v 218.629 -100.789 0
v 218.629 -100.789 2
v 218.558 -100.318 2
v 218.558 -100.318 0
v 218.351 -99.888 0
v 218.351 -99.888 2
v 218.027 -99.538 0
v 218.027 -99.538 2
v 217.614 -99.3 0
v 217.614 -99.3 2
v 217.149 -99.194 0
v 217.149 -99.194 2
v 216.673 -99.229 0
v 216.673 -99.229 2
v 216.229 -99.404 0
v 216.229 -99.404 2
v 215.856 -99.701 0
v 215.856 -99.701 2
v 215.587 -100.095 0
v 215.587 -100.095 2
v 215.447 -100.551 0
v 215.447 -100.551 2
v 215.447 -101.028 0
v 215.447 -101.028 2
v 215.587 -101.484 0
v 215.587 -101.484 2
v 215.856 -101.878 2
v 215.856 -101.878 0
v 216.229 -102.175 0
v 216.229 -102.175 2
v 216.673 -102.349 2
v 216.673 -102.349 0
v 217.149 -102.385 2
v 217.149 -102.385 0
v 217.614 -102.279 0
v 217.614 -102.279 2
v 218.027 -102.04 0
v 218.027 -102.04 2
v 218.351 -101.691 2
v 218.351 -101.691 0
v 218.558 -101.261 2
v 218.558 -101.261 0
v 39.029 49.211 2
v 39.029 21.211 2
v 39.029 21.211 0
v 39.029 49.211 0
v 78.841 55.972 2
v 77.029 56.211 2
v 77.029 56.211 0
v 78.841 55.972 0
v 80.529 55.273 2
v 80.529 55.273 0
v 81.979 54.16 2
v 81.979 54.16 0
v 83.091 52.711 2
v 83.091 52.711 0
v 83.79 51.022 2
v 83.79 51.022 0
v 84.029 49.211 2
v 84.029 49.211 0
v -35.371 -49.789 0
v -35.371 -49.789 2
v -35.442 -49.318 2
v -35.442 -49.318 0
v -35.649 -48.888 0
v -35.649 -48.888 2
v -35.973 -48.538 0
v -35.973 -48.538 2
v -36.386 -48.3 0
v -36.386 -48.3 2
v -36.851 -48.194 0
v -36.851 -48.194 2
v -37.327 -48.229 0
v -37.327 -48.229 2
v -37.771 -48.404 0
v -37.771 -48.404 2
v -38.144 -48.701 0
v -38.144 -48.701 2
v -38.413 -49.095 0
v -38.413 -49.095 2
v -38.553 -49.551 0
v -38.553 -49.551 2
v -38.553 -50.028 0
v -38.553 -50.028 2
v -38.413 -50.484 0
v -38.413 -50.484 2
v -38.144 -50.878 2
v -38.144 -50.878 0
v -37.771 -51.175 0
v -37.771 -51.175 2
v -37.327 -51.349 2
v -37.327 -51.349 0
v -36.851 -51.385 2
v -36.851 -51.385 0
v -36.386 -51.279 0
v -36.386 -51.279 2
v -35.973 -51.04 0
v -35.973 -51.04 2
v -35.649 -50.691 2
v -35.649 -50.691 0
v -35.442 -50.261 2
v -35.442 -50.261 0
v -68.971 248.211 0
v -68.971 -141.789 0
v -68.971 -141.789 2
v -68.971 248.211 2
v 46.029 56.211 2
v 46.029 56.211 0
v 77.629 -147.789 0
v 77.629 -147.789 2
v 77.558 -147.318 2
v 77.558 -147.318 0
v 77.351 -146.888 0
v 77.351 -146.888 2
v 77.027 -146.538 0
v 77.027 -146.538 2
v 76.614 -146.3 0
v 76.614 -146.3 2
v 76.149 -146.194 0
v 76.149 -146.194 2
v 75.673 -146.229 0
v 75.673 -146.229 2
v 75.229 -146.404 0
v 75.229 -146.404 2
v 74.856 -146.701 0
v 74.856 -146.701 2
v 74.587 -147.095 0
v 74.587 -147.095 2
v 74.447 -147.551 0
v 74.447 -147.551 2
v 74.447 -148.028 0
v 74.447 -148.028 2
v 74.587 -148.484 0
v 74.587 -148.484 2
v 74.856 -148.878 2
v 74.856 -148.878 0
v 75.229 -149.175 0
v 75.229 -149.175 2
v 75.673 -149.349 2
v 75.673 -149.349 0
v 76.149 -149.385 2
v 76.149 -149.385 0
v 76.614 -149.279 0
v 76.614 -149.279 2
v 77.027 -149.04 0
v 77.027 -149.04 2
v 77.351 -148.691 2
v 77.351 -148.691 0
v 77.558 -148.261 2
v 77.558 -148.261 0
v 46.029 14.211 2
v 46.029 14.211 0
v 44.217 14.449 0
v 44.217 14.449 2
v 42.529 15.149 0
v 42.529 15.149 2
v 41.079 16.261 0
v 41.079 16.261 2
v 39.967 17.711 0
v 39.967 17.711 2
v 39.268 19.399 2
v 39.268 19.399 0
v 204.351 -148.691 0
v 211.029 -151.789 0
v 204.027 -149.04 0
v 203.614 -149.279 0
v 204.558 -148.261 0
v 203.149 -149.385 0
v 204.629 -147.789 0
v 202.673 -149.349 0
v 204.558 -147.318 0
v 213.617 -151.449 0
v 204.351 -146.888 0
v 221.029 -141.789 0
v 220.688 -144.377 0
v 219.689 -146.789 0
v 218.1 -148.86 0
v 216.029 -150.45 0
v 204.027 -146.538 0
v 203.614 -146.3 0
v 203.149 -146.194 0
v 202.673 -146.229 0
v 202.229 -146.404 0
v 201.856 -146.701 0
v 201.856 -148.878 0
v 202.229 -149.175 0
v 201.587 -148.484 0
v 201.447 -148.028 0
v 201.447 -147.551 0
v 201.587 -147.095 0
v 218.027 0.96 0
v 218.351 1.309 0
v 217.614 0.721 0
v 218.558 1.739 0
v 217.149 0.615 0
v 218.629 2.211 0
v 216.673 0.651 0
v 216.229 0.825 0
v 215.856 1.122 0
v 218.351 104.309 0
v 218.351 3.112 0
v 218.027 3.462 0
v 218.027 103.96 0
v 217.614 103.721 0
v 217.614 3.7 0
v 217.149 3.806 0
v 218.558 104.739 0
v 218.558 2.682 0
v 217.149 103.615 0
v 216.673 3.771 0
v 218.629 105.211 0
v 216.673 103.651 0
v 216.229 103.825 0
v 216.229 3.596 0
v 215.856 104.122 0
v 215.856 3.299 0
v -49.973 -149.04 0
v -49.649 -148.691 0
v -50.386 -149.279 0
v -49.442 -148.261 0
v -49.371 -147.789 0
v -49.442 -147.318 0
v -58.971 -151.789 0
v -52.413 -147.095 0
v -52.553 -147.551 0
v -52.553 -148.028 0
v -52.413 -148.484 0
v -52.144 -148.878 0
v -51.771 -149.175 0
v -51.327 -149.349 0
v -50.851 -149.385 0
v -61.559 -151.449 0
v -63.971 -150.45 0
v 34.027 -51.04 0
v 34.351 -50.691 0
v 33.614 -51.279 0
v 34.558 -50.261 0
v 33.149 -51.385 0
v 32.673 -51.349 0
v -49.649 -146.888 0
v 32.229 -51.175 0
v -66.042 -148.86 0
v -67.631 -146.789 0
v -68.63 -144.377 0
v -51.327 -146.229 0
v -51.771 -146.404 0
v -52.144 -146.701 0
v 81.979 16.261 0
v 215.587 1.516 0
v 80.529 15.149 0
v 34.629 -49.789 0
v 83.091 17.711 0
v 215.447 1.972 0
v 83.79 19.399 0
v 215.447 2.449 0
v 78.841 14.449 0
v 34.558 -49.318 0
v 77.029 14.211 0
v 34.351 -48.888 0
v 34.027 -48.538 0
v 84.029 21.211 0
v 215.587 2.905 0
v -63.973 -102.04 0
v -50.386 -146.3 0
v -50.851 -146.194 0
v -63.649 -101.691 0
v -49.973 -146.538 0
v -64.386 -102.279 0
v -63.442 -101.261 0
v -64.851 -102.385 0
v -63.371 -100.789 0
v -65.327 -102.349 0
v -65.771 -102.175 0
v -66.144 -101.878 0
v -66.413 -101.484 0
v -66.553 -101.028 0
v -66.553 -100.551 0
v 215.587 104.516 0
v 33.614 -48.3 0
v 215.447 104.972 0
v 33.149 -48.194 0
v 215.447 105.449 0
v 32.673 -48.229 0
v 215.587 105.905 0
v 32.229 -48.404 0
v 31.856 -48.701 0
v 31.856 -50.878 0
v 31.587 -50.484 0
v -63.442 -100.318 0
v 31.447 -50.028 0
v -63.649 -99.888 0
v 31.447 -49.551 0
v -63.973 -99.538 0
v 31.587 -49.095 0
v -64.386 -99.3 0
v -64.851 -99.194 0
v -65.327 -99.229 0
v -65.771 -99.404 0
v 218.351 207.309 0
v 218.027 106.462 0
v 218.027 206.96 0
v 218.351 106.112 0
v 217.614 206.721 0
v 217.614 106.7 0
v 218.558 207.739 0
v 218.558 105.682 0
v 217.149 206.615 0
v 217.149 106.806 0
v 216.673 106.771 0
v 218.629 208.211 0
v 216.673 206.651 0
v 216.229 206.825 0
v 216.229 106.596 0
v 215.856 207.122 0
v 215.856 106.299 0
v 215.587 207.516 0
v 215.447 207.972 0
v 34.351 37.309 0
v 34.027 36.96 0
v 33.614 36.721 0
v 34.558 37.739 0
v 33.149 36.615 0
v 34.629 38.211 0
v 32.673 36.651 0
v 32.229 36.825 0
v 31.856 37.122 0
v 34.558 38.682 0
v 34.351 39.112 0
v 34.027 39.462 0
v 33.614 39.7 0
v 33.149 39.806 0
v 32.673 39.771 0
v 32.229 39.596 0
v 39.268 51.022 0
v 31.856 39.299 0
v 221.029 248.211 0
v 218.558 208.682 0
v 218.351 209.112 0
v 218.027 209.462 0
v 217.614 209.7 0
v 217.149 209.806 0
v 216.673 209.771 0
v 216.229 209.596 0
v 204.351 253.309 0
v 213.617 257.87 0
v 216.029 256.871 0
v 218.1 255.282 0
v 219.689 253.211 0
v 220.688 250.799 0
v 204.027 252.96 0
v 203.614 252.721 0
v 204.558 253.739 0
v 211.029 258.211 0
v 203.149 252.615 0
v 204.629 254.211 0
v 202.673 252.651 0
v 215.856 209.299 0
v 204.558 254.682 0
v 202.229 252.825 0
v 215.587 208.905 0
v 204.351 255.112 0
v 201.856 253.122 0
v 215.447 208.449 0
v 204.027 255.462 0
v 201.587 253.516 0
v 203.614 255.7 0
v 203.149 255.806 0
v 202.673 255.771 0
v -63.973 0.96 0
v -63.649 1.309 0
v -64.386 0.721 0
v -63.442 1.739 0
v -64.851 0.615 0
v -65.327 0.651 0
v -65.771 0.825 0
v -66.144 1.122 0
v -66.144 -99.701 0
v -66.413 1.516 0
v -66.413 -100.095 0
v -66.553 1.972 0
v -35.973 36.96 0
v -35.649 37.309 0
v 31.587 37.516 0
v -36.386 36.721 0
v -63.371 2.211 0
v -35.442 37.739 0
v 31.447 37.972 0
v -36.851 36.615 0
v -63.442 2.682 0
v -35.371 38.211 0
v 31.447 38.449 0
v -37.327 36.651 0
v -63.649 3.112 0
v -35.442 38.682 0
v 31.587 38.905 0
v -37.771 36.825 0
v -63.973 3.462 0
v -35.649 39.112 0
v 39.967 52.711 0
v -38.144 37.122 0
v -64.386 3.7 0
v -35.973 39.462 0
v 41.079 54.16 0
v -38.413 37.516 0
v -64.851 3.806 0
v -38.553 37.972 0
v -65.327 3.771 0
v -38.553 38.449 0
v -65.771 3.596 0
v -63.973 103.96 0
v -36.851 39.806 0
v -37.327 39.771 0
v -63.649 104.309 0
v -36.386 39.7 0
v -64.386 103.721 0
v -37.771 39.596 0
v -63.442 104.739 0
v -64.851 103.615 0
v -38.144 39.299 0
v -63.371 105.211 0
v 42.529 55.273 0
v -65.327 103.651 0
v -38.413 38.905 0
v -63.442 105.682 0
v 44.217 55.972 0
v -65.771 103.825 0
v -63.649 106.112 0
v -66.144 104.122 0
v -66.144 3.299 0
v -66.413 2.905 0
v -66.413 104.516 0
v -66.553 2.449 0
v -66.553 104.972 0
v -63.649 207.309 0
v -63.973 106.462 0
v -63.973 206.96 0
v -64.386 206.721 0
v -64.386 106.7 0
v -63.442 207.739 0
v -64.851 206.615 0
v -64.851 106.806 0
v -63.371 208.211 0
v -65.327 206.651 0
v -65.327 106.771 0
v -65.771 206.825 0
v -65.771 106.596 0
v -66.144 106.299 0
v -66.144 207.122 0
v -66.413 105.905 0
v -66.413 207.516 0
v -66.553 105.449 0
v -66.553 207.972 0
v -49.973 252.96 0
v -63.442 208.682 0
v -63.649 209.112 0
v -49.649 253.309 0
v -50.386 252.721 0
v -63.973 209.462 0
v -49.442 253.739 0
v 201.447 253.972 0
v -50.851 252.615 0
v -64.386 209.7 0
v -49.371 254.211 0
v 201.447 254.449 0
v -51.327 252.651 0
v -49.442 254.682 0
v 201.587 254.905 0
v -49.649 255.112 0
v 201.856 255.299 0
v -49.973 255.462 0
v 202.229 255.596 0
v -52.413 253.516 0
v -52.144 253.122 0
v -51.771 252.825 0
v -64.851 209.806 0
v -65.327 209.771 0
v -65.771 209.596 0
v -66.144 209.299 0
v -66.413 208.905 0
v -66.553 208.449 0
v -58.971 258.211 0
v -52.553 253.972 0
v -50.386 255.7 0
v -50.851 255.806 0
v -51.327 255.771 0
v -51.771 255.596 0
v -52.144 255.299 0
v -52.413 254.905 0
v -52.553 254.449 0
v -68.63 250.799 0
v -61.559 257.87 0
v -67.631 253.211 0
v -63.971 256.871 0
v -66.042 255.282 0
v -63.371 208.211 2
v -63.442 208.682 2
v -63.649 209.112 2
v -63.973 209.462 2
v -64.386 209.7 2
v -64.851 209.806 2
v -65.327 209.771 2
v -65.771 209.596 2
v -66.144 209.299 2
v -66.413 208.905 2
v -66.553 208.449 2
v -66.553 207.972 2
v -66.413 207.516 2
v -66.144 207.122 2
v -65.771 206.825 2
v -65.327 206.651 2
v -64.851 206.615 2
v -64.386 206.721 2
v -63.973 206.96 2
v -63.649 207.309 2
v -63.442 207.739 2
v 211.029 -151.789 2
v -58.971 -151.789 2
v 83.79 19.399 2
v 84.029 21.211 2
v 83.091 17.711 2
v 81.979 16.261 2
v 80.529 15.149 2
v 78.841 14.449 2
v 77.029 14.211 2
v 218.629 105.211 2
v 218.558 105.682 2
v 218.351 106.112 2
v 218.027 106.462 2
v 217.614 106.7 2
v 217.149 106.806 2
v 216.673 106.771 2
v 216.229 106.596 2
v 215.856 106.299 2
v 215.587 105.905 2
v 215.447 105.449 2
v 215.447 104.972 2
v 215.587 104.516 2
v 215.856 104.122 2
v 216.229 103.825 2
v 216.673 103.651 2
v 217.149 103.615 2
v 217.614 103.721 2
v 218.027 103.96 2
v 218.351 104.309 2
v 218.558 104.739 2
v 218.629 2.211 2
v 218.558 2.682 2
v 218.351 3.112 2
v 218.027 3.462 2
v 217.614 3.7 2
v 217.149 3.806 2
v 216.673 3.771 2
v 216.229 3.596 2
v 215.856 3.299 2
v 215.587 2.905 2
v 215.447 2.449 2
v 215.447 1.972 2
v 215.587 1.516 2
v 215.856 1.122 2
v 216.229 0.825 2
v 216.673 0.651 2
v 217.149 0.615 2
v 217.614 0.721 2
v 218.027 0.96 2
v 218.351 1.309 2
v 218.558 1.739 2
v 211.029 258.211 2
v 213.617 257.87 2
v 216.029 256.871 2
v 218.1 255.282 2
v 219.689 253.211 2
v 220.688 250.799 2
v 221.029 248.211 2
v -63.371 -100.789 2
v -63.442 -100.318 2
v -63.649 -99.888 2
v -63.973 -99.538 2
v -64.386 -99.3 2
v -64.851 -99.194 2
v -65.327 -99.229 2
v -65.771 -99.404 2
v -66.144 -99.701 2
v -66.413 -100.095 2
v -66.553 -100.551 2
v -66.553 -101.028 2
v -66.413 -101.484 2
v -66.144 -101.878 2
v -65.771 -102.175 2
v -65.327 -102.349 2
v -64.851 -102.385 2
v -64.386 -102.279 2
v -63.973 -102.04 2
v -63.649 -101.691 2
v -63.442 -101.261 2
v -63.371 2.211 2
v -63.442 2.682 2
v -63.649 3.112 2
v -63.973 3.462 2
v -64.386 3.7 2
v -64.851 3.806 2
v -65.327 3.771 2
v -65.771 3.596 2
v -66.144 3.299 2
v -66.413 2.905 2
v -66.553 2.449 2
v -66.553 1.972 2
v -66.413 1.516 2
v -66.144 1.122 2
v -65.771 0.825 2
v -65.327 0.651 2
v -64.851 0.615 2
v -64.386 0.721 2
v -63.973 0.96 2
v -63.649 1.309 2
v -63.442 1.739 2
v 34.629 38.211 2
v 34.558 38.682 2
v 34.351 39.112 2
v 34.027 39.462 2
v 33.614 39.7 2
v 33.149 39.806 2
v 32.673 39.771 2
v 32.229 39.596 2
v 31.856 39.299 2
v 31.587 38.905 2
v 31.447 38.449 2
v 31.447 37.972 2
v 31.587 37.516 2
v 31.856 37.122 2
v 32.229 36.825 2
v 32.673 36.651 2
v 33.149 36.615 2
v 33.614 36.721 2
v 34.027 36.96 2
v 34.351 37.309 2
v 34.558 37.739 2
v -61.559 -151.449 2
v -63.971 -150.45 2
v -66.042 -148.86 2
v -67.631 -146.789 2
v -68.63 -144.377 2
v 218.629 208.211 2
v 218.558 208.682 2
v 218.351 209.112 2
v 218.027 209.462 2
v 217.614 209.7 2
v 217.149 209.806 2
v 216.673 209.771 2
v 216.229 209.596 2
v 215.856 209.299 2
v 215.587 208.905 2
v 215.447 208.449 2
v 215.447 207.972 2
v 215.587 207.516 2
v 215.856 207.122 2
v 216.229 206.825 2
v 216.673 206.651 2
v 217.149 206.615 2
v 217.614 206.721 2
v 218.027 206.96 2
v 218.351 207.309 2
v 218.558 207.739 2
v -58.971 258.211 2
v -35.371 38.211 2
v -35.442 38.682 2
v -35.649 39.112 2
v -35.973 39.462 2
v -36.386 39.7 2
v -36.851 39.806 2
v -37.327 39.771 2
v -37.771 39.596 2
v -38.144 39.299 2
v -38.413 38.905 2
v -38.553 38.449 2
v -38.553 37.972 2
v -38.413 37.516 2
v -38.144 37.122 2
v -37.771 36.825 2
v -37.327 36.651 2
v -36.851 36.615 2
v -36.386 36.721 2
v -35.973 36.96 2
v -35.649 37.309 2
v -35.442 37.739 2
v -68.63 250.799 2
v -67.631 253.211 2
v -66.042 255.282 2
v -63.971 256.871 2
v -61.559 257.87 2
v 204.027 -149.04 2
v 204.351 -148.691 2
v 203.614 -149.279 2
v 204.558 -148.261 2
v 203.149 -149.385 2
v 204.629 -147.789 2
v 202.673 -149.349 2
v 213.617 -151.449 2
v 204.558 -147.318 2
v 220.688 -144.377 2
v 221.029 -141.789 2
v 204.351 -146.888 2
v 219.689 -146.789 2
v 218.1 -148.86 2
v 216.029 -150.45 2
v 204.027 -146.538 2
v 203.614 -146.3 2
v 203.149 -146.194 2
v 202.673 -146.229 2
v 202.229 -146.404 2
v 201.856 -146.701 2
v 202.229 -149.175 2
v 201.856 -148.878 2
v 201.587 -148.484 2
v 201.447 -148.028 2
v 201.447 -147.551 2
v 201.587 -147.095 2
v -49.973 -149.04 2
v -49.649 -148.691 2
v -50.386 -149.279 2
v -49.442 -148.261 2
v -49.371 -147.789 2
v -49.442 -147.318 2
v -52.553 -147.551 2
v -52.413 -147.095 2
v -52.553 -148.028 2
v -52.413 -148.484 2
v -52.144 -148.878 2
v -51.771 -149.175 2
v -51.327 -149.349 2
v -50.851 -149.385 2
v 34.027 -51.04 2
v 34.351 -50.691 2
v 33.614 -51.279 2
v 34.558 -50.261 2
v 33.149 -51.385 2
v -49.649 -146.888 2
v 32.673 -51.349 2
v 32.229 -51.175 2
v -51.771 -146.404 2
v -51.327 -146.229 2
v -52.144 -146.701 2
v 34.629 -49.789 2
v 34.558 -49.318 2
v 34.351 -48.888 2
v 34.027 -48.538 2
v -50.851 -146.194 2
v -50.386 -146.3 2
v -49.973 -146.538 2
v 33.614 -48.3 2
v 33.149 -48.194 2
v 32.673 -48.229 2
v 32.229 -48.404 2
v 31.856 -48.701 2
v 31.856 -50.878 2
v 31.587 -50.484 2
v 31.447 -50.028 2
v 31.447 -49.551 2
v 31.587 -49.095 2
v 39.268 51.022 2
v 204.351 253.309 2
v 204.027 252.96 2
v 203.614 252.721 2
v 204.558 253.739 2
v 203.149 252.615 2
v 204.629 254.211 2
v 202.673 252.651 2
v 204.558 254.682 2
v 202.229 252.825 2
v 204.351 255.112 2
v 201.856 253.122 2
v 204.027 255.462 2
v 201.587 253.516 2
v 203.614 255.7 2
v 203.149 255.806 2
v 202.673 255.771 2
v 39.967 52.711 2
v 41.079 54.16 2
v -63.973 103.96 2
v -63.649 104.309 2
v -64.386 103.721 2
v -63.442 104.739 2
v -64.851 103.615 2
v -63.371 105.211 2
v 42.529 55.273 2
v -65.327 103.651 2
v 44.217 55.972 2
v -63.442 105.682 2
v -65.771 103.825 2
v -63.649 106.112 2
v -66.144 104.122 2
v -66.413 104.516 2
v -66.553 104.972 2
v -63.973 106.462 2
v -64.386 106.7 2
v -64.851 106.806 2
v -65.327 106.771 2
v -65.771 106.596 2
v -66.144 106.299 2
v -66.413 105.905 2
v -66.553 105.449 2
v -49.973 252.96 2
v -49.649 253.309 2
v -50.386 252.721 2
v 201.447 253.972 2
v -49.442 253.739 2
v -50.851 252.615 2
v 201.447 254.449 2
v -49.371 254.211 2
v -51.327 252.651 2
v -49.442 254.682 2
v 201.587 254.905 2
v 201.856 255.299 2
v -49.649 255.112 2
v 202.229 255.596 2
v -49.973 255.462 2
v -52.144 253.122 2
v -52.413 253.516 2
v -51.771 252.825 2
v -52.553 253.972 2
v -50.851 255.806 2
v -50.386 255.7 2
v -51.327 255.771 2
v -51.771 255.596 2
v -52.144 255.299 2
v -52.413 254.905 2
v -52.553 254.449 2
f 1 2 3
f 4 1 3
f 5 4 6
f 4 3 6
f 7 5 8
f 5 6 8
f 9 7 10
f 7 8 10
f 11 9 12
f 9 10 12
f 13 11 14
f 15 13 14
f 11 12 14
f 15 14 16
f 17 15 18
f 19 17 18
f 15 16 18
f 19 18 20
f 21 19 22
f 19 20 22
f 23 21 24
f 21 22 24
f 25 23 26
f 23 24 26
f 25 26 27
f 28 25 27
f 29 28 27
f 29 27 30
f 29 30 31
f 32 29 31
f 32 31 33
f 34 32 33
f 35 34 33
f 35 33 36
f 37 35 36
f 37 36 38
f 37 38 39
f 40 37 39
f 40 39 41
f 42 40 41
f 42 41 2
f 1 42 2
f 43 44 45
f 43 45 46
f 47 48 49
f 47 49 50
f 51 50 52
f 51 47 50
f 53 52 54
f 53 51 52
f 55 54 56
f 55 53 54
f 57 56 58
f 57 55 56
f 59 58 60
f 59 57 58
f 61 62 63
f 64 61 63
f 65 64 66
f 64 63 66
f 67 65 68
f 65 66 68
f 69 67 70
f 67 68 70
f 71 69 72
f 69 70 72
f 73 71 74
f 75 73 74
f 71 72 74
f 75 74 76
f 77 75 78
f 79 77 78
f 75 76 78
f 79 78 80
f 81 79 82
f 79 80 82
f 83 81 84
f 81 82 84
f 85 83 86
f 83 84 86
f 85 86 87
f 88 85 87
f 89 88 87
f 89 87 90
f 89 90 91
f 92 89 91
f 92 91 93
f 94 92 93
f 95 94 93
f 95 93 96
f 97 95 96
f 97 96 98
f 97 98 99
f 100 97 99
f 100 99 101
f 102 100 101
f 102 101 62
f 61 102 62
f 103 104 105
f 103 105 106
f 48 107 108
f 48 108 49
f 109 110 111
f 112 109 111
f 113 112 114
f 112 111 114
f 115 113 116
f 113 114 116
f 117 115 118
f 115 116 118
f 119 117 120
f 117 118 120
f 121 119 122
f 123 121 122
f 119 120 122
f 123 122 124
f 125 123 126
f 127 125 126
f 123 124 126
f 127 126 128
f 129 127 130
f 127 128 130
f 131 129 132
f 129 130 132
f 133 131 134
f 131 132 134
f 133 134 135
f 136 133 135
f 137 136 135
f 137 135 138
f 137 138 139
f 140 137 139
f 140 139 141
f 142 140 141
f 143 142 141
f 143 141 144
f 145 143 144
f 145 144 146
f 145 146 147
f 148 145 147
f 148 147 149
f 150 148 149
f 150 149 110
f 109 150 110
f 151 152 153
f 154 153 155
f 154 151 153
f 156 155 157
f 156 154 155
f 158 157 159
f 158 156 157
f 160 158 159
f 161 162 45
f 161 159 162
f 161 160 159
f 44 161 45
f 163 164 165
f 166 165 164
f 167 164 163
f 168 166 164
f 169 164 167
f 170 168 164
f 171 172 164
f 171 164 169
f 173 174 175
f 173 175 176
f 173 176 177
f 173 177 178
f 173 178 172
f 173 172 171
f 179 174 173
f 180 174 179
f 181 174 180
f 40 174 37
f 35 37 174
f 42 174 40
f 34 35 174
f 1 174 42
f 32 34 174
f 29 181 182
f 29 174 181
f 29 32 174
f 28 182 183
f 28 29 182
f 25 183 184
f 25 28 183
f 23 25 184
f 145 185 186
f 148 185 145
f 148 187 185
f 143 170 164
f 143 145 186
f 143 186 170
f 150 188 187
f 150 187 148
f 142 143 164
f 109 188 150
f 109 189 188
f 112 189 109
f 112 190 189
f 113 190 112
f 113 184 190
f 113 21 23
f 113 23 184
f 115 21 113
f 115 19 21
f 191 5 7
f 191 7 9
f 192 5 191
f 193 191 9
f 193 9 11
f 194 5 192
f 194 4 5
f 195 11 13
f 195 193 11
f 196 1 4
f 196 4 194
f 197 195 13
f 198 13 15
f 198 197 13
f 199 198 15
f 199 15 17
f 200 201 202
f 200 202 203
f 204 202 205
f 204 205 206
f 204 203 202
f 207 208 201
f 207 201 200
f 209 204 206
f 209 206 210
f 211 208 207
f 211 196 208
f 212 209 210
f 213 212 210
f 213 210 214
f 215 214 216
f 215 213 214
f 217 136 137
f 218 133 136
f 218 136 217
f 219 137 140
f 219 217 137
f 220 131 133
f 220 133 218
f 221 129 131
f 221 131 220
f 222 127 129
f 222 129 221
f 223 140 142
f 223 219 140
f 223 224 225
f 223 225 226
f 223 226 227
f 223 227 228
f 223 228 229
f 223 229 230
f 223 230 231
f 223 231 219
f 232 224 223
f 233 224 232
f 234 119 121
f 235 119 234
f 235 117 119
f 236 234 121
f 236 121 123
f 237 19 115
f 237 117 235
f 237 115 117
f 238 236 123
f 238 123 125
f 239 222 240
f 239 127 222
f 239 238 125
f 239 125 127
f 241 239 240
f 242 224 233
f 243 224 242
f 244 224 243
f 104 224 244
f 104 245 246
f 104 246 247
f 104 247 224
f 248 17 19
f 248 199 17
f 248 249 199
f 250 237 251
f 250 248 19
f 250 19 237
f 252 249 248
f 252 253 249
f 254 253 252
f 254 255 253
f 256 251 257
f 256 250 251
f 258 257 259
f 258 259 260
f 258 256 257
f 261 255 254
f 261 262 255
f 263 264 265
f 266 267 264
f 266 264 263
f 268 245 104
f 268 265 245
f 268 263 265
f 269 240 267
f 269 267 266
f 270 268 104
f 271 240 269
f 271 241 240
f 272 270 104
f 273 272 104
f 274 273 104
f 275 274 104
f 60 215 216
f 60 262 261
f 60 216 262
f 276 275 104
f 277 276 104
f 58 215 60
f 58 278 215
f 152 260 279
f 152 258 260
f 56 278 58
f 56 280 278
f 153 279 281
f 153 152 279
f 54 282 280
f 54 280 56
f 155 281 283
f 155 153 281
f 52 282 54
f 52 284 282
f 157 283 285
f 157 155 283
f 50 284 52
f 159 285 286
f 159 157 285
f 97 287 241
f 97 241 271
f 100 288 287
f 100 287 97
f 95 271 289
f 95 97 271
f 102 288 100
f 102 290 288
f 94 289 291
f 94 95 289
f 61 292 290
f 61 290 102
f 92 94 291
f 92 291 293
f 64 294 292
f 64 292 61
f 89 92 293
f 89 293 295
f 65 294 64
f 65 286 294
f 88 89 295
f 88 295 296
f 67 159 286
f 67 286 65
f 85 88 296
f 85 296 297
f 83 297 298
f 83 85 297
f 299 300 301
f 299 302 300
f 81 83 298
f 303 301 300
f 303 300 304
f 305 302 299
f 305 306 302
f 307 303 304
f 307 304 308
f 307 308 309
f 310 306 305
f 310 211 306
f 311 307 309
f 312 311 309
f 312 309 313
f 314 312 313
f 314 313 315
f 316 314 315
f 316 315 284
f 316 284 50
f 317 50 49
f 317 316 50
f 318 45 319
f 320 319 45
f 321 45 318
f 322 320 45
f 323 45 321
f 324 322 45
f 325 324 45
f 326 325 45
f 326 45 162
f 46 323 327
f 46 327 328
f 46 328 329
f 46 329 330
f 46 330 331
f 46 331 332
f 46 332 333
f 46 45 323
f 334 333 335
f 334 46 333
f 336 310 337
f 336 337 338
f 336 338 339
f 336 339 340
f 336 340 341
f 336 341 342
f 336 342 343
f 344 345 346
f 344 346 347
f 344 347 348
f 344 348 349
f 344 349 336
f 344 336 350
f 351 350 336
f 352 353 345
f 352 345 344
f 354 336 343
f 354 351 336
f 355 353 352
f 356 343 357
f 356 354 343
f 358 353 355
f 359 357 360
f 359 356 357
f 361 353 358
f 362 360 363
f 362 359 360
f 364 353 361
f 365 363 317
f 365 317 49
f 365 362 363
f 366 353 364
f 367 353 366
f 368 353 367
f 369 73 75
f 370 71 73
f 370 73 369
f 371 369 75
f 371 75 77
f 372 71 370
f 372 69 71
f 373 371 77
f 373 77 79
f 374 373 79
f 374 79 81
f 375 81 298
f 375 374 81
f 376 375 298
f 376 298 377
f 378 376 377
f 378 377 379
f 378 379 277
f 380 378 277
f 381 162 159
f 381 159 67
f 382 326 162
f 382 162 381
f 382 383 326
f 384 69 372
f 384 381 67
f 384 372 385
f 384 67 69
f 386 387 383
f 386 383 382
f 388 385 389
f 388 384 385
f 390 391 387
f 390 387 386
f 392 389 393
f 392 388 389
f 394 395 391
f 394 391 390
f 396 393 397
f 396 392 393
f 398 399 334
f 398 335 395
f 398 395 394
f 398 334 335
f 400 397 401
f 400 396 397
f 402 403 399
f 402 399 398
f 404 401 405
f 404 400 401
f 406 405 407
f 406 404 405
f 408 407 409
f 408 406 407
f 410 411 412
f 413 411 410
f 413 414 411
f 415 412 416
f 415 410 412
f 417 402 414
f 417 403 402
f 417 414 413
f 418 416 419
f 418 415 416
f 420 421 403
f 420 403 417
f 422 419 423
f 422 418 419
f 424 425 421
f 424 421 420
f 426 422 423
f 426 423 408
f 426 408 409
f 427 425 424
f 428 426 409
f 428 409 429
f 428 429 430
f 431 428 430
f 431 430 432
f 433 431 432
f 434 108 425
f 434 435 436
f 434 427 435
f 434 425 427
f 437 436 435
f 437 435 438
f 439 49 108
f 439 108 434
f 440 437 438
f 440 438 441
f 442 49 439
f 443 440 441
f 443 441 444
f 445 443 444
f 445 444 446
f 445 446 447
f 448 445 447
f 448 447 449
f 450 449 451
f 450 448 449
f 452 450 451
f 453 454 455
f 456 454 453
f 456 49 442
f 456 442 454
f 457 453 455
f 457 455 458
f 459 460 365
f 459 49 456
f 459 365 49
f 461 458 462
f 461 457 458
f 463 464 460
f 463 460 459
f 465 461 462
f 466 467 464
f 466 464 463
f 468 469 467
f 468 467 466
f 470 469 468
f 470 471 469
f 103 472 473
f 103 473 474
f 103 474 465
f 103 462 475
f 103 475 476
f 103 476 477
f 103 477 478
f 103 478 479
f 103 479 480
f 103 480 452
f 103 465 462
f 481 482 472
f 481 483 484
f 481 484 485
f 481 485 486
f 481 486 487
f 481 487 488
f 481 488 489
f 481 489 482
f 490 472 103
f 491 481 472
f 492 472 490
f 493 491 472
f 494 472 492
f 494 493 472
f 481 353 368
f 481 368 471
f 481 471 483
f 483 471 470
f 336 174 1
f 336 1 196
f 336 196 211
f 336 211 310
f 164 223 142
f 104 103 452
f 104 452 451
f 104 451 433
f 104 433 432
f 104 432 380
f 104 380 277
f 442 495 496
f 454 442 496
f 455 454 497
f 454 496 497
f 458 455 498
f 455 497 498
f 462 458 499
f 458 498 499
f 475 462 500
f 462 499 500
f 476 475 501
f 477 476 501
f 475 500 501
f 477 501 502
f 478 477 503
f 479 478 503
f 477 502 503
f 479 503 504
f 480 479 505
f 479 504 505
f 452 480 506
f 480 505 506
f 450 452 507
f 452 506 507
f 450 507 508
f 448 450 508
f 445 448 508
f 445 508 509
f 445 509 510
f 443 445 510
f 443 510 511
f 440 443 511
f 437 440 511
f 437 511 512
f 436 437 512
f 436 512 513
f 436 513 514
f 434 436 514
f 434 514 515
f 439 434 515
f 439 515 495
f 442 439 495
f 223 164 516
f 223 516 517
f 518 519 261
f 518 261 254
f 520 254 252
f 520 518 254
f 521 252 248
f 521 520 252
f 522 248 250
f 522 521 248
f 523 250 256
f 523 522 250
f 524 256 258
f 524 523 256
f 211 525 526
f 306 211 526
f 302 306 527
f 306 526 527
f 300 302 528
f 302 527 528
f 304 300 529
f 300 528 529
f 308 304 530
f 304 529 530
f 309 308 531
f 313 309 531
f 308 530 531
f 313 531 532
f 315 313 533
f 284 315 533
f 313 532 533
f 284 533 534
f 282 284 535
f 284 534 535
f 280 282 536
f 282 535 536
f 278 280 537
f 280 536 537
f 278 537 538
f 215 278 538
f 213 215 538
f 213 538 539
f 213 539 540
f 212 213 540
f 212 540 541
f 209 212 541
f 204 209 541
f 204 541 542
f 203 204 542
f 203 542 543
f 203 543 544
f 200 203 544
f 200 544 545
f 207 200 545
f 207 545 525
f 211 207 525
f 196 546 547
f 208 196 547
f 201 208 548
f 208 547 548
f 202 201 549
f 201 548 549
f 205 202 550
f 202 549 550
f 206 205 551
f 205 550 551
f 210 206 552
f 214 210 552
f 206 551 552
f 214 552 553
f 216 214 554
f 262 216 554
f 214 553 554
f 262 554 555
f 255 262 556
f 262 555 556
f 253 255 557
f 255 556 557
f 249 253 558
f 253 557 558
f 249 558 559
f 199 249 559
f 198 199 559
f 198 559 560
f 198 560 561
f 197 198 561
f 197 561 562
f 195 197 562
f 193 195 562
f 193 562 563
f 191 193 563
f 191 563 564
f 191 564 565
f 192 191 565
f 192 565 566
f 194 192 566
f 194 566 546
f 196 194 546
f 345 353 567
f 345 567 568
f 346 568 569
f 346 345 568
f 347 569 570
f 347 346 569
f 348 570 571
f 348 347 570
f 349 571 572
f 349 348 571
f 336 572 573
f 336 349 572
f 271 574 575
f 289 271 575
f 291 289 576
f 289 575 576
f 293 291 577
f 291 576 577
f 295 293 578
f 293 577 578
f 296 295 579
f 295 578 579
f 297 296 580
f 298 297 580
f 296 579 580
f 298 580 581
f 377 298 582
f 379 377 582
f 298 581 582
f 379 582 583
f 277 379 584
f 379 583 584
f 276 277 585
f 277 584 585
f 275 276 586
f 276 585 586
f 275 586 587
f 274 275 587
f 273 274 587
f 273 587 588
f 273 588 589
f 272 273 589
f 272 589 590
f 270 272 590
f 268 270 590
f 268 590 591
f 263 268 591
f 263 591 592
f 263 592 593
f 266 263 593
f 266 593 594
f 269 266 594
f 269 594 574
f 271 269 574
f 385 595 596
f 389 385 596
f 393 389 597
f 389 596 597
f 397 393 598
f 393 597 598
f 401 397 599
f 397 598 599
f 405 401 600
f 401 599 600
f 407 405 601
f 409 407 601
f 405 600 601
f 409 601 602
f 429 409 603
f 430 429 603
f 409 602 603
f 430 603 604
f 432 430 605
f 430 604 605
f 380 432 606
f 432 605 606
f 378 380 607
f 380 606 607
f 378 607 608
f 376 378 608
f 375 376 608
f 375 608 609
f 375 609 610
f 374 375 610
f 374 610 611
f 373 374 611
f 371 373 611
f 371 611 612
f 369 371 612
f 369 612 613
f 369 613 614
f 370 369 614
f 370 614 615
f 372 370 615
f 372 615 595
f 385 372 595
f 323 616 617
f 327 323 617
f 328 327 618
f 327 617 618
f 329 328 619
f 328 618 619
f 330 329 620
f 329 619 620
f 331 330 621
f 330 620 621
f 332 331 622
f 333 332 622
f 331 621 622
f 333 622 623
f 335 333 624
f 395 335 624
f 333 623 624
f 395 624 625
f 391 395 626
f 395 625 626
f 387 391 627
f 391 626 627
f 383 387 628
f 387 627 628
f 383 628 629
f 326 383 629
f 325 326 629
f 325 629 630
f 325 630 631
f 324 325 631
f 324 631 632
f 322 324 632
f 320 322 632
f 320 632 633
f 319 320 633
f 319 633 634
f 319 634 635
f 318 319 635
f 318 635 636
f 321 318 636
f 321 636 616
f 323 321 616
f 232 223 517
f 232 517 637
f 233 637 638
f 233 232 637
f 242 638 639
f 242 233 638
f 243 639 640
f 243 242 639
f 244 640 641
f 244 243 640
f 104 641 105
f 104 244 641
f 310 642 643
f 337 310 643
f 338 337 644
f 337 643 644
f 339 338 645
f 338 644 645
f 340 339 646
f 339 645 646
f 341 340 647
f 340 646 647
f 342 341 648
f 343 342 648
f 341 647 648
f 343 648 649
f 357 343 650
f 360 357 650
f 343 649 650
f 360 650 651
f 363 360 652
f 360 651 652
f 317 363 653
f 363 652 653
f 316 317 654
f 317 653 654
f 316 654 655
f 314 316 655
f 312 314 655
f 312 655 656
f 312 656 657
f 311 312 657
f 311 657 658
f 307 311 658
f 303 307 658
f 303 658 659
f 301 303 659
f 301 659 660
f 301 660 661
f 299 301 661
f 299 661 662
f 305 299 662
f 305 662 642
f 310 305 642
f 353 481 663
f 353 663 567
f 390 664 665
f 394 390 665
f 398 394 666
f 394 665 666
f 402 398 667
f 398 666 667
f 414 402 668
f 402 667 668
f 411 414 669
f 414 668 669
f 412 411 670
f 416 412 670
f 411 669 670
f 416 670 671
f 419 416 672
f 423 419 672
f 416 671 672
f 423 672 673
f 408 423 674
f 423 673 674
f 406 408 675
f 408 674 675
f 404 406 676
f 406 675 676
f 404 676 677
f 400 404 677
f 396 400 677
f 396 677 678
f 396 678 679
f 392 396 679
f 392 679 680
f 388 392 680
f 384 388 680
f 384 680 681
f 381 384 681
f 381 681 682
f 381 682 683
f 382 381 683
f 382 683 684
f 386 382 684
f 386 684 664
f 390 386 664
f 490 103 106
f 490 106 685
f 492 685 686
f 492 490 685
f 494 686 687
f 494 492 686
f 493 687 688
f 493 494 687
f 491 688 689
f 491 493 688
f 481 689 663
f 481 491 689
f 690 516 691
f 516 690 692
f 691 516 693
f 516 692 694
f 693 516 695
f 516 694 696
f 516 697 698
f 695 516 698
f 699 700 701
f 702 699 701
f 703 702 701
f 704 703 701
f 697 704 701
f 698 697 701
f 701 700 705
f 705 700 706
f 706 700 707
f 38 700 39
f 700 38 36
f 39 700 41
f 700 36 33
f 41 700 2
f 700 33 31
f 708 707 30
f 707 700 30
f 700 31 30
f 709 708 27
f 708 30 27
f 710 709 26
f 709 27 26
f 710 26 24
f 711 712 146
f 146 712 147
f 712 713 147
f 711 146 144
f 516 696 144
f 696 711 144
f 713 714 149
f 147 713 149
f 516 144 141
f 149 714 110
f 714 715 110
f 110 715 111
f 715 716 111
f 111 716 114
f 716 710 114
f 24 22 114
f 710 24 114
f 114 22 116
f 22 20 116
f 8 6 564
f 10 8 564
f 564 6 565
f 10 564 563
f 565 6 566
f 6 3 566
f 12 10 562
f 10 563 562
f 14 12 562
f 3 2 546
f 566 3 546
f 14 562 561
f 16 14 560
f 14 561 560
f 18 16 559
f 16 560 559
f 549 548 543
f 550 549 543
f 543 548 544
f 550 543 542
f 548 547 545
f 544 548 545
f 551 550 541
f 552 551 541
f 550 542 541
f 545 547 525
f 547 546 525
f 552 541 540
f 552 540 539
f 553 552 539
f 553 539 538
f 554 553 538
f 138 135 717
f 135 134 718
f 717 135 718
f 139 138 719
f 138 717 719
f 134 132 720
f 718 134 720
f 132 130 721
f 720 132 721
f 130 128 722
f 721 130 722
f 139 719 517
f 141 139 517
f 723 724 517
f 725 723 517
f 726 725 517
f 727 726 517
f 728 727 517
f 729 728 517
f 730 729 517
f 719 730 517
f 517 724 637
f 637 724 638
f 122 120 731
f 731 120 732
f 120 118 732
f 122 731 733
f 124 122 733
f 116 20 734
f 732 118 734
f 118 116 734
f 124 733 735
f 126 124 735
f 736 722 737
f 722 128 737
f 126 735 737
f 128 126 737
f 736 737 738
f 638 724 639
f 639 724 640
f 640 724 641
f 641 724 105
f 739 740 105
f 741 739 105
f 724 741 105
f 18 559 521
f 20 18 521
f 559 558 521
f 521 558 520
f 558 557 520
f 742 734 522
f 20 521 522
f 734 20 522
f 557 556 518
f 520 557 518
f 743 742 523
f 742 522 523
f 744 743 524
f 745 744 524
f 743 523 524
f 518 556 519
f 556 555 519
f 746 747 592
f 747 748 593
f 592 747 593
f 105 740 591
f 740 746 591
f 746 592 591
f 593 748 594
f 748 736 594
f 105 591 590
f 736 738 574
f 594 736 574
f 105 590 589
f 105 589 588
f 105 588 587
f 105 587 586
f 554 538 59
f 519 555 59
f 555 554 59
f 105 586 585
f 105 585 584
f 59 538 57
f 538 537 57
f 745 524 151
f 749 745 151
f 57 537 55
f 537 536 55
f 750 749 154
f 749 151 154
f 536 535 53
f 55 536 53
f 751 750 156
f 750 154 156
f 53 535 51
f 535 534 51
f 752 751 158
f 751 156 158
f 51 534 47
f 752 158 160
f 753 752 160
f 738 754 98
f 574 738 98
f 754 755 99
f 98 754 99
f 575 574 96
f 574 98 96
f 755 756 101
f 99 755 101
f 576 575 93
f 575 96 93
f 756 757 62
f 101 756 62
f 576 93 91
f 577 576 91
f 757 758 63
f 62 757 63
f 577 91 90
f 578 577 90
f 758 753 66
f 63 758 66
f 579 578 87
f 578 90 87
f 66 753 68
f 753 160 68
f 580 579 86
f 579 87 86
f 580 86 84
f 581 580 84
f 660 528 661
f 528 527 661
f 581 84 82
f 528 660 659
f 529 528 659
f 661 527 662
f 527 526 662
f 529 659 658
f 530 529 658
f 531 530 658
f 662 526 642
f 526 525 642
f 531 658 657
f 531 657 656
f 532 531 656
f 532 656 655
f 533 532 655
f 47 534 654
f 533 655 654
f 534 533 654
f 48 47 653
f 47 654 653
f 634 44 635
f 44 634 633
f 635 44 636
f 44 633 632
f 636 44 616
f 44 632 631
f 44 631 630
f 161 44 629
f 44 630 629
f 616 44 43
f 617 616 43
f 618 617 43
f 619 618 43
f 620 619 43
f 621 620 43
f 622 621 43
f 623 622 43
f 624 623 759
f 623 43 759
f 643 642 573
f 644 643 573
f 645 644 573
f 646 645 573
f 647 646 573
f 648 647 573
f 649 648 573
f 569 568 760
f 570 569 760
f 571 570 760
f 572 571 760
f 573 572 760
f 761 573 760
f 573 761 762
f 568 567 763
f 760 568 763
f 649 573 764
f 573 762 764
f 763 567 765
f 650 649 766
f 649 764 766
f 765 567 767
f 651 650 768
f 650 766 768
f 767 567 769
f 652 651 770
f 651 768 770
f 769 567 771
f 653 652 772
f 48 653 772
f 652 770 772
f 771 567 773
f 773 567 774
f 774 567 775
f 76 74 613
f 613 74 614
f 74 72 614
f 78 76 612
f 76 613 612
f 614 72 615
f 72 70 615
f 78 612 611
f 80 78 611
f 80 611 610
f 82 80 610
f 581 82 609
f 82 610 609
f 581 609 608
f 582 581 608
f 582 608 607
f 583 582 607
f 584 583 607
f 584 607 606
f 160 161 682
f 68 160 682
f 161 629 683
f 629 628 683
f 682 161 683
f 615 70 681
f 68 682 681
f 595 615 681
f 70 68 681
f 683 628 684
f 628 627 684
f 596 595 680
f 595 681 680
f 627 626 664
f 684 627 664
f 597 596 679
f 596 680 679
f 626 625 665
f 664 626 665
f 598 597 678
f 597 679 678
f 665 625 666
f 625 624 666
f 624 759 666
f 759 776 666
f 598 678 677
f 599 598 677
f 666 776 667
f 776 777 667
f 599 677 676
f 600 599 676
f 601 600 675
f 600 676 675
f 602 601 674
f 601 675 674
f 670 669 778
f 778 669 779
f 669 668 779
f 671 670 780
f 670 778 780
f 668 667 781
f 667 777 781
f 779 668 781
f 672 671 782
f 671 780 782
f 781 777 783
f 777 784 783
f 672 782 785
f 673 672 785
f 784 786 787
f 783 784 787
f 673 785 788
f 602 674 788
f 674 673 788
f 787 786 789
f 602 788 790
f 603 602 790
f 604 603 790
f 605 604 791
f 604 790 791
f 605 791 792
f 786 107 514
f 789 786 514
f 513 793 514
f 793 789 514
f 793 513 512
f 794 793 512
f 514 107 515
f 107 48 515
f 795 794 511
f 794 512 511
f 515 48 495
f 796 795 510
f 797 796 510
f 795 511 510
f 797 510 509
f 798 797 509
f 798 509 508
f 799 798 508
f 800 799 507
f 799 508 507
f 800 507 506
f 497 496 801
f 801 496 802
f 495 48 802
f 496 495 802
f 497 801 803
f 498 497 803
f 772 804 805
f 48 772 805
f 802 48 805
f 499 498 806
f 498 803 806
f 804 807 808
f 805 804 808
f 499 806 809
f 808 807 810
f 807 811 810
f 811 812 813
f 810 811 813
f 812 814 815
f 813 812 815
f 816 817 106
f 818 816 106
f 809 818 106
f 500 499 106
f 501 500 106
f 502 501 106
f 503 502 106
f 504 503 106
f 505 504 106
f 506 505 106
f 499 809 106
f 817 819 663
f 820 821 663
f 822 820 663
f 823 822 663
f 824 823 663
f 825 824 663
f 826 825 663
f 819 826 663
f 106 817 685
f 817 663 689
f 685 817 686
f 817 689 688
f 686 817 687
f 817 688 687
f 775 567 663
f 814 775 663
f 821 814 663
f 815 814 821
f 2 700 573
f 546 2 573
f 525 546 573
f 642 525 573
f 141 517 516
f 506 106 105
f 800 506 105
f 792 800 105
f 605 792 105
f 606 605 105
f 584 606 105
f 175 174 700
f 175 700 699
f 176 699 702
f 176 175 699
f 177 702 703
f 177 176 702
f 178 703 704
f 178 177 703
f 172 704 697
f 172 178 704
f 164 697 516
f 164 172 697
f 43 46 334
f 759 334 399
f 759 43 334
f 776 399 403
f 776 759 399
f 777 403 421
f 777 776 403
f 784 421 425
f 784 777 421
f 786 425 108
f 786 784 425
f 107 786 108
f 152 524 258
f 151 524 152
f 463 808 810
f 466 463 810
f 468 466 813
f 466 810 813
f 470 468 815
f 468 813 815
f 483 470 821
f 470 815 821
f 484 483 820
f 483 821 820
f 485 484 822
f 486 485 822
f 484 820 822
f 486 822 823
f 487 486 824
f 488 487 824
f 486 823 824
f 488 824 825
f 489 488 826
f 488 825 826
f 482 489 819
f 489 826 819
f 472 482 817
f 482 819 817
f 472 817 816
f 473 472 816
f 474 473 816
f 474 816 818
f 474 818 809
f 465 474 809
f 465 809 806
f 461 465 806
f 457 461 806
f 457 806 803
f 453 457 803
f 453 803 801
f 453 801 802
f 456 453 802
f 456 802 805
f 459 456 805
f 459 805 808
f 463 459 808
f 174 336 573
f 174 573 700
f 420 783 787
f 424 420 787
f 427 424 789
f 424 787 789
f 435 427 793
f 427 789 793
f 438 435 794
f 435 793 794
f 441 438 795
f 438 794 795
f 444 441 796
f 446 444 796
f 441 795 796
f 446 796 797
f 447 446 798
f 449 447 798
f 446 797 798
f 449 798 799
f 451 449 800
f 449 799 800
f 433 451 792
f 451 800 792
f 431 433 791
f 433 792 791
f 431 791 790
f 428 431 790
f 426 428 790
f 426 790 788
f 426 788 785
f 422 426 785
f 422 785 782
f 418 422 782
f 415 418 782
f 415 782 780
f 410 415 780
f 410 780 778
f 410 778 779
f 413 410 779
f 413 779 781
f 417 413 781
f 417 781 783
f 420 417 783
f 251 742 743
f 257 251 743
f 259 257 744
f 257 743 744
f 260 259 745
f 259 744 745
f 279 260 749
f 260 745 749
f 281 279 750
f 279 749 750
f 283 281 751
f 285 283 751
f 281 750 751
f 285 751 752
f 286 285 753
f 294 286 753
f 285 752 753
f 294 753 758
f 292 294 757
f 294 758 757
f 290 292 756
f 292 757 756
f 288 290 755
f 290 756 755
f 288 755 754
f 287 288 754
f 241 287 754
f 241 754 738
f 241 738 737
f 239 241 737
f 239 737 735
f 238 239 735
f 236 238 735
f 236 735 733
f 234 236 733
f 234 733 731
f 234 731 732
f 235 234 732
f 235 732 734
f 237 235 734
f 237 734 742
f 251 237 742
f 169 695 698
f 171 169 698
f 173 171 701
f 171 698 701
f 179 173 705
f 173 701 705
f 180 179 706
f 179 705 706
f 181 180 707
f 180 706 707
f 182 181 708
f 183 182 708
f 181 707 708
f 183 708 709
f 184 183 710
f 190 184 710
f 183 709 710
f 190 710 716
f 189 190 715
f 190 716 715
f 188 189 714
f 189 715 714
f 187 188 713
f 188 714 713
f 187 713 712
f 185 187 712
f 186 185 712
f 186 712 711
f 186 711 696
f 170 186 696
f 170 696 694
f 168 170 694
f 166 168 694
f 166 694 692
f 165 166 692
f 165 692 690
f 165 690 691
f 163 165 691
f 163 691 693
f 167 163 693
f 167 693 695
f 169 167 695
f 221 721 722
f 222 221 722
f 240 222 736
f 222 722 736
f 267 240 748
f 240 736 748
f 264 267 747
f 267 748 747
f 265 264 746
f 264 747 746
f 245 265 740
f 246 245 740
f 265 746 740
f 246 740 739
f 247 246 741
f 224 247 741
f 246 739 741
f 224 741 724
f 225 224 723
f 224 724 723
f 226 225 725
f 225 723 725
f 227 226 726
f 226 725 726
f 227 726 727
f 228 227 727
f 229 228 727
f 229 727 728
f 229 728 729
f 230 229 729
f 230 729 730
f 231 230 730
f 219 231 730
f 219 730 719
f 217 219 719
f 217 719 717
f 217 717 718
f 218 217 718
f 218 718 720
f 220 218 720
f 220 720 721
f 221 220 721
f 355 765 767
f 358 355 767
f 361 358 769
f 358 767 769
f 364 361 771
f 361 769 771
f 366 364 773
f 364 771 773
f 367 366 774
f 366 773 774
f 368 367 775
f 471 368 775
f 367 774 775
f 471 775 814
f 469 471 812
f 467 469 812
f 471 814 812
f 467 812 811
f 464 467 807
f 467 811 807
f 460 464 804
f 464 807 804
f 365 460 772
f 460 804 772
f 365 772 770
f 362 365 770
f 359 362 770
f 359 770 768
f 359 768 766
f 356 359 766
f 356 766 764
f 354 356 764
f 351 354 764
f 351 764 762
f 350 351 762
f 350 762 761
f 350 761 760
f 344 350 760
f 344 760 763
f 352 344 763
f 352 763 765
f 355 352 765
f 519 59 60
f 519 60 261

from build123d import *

# Parameters (mm, degrees)
EXTRUDE_1_DEPTH     = 2
SKETCH_2_R          = 1.6
CUT_EXTRUDE_1_DEPTH = 340.897900211
SKETCH_3_R          = 1.6
CUT_EXTRUDE_2_DEPTH = 340.897900211


with BuildPart() as part:
    # 草图1 → 凸台-拉伸1 (new body)
    with BuildSketch(Plane.XY):
        with BuildLine():
            Line((-58.97100696, 258.210702341), (211.02899304, 258.210702341))
            ThreePointArc((211.02899304, 258.210702341), (218.100060852, 255.281770153), (221.02899304, 248.210702341))
            Line((221.02899304, 248.210702341), (221.02899304, -141.789297659))
            ThreePointArc((221.02899304, -141.789297659), (218.100060852, -148.860365471), (211.02899304, -151.789297659))
            Line((211.02899304, -151.789297659), (-58.97100696, -151.789297659))
            ThreePointArc((-58.97100696, -151.789297659), (-66.042074772, -148.860365471), (-68.97100696, -141.789297659))
            Line((-68.97100696, -141.789297659), (-68.97100696, 248.210702341))
            ThreePointArc((-68.97100696, 248.210702341), (-66.042074772, 255.281770153), (-58.97100696, 258.210702341))
        make_face()
    extrude(amount=EXTRUDE_1_DEPTH)

    # 草图2 → 切除-拉伸1 (cut, through all)
    with BuildSketch(Plane.XY.offset(2)):
        with Locations((-64.97100696, 208.210702341)):
            Circle(SKETCH_2_R)
        with Locations((-64.97100696, 105.210702341)):
            Circle(SKETCH_2_R)
        with Locations((-64.97100696, 2.210702341)):
            Circle(SKETCH_2_R)
        with Locations((-64.97100696, -100.789297659)):
            Circle(SKETCH_2_R)
        with Locations((217.02899304, 208.210702341)):
            Circle(SKETCH_2_R)
        with Locations((217.02899304, 105.210702341)):
            Circle(SKETCH_2_R)
        with Locations((217.02899304, 2.210702341)):
            Circle(SKETCH_2_R)
        with Locations((217.02899304, -100.789297659)):
            Circle(SKETCH_2_R)
        with Locations((-50.97100696, 254.210702341)):
            Circle(SKETCH_2_R)
        with Locations((203.02899304, 254.210702341)):
            Circle(SKETCH_2_R)
        with Locations((-50.97100696, -147.789297659)):
            Circle(SKETCH_2_R)
        with Locations((76.02899304, -147.789297659)):
            Circle(SKETCH_2_R)
        with Locations((203.02899304, -147.789297659)):
            Circle(SKETCH_2_R)
    extrude(amount=-CUT_EXTRUDE_1_DEPTH, mode=Mode.SUBTRACT)

    # 草图3 → 切除-拉伸2 (cut, through all)
    with BuildSketch(Plane.XY.offset(2)):
        with Locations((33.02899304, 38.210702341)):
            Circle(SKETCH_3_R)
        with Locations((33.02899304, -49.789297659)):
            Circle(SKETCH_3_R)
        with Locations((-36.97100696, -49.789297659)):
            Circle(SKETCH_3_R)
        with Locations((-36.97100696, 38.210702341)):
            Circle(SKETCH_3_R)
        with BuildLine():
            Line((46.02899304, 56.210702341), (77.02899304, 56.210702341))
            ThreePointArc((77.02899304, 56.210702341), (81.978740508, 54.160449809), (84.02899304, 49.210702341))
            Line((84.02899304, 49.210702341), (84.02899304, 21.210702341))
            ThreePointArc((84.02899304, 21.210702341), (81.978740508, 16.260954873), (77.02899304, 14.210702341))
            Line((77.02899304, 14.210702341), (46.02899304, 14.210702341))
            ThreePointArc((46.02899304, 14.210702341), (41.079245572, 16.260954873), (39.02899304, 21.210702341))
            Line((39.02899304, 21.210702341), (39.02899304, 49.210702341))
            ThreePointArc((39.02899304, 49.210702341), (41.079245572, 54.160449809), (46.02899304, 56.210702341))
        make_face()
    extrude(amount=-CUT_EXTRUDE_2_DEPTH, mode=Mode.SUBTRACT)


solid = part.part
